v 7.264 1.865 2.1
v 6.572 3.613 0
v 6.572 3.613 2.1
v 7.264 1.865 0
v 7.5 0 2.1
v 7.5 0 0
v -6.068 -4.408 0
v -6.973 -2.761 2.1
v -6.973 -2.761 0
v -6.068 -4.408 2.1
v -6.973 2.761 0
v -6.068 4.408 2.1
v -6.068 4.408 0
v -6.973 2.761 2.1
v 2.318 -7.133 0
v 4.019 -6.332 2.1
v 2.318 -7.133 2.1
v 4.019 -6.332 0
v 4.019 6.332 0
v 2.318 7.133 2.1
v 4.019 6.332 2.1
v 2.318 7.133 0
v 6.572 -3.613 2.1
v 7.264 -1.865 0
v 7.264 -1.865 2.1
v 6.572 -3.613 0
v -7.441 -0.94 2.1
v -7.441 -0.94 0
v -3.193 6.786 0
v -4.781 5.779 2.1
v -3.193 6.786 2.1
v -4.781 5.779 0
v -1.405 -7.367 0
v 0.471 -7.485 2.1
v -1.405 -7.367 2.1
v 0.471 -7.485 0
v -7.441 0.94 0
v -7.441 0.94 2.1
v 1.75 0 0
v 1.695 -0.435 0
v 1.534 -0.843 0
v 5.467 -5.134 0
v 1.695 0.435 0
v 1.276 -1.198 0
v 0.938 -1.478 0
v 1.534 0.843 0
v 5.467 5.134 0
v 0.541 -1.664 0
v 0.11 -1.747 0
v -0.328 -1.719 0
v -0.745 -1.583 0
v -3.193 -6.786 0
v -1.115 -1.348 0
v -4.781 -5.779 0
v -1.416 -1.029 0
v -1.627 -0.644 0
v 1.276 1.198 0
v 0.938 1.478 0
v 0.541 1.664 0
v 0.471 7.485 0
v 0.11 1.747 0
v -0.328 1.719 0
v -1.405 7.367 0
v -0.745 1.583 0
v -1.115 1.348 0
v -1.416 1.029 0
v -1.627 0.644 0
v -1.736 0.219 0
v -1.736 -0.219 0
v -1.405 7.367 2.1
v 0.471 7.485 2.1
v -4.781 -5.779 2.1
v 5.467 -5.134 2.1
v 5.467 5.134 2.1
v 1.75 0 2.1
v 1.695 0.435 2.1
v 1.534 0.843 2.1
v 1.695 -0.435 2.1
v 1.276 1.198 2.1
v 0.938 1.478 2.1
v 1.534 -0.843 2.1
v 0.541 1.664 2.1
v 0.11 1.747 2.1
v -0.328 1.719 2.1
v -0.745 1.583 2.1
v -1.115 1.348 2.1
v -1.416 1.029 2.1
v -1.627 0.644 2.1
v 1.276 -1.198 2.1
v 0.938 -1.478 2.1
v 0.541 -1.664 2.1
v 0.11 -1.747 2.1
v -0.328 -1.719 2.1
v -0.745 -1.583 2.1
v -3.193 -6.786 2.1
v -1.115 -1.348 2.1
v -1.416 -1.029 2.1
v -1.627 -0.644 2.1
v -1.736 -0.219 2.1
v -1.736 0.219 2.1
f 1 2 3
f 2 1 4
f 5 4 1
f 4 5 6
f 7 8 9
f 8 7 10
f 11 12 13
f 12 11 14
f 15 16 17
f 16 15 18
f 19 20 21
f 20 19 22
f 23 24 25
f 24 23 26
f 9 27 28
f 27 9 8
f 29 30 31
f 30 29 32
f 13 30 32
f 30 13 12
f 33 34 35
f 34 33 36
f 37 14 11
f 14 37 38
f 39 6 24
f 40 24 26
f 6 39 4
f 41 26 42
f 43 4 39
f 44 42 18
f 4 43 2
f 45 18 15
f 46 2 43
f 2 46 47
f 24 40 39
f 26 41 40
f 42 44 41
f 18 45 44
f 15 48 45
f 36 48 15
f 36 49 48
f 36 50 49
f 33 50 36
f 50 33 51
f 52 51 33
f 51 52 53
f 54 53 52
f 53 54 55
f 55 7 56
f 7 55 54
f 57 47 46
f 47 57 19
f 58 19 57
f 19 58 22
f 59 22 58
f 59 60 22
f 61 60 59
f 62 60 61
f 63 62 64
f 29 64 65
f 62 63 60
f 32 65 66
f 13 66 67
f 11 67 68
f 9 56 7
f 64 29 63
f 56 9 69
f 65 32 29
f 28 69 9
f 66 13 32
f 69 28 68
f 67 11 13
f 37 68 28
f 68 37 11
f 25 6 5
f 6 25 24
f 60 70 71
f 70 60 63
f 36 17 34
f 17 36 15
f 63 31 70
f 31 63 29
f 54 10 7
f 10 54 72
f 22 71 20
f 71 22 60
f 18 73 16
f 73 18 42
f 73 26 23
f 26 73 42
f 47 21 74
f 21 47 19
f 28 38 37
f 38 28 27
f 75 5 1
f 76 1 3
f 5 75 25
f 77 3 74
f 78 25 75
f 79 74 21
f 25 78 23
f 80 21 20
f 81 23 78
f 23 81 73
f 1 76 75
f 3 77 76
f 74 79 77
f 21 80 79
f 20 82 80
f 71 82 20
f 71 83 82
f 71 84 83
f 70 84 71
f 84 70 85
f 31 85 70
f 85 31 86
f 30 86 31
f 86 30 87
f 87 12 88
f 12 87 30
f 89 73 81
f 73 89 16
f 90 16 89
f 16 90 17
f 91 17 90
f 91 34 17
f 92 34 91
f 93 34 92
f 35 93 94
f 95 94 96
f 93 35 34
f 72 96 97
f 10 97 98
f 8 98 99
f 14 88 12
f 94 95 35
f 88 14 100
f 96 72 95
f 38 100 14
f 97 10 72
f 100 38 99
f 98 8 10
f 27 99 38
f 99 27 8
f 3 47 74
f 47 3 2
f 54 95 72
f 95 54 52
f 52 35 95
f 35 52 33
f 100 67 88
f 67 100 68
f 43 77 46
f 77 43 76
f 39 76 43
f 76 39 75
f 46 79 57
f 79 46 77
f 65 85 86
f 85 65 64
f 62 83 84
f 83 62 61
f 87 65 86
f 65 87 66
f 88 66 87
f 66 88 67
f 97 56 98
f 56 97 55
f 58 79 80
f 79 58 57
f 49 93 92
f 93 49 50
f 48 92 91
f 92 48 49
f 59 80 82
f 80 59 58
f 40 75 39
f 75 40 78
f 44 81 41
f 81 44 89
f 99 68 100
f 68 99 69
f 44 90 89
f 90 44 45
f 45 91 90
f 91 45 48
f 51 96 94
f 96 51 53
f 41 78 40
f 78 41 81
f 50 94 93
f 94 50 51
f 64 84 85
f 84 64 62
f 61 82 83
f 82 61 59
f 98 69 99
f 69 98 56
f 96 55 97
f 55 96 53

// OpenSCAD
// ========================================================================================
// Robori Mendel
// X belt guide
// GNU GPL v3
//
// Contact : support@robori.com
// Reference : http://www.robori.com/documentation/Mendel
//
// History :
// 6 Feb 2015 - First version
// ========================================================================================

$fn = 25;

x_belt_guide();

module x_belt_guide()
{
	od = 15;
	id = 3 + 0.5;
	height = 2.1;

	difference()
	{
		cylinder(r=od/2, h=height, center=false);
		translate([0, 0, -1]) cylinder(r=id/2, h=height + 2, center=false);
	}
}
